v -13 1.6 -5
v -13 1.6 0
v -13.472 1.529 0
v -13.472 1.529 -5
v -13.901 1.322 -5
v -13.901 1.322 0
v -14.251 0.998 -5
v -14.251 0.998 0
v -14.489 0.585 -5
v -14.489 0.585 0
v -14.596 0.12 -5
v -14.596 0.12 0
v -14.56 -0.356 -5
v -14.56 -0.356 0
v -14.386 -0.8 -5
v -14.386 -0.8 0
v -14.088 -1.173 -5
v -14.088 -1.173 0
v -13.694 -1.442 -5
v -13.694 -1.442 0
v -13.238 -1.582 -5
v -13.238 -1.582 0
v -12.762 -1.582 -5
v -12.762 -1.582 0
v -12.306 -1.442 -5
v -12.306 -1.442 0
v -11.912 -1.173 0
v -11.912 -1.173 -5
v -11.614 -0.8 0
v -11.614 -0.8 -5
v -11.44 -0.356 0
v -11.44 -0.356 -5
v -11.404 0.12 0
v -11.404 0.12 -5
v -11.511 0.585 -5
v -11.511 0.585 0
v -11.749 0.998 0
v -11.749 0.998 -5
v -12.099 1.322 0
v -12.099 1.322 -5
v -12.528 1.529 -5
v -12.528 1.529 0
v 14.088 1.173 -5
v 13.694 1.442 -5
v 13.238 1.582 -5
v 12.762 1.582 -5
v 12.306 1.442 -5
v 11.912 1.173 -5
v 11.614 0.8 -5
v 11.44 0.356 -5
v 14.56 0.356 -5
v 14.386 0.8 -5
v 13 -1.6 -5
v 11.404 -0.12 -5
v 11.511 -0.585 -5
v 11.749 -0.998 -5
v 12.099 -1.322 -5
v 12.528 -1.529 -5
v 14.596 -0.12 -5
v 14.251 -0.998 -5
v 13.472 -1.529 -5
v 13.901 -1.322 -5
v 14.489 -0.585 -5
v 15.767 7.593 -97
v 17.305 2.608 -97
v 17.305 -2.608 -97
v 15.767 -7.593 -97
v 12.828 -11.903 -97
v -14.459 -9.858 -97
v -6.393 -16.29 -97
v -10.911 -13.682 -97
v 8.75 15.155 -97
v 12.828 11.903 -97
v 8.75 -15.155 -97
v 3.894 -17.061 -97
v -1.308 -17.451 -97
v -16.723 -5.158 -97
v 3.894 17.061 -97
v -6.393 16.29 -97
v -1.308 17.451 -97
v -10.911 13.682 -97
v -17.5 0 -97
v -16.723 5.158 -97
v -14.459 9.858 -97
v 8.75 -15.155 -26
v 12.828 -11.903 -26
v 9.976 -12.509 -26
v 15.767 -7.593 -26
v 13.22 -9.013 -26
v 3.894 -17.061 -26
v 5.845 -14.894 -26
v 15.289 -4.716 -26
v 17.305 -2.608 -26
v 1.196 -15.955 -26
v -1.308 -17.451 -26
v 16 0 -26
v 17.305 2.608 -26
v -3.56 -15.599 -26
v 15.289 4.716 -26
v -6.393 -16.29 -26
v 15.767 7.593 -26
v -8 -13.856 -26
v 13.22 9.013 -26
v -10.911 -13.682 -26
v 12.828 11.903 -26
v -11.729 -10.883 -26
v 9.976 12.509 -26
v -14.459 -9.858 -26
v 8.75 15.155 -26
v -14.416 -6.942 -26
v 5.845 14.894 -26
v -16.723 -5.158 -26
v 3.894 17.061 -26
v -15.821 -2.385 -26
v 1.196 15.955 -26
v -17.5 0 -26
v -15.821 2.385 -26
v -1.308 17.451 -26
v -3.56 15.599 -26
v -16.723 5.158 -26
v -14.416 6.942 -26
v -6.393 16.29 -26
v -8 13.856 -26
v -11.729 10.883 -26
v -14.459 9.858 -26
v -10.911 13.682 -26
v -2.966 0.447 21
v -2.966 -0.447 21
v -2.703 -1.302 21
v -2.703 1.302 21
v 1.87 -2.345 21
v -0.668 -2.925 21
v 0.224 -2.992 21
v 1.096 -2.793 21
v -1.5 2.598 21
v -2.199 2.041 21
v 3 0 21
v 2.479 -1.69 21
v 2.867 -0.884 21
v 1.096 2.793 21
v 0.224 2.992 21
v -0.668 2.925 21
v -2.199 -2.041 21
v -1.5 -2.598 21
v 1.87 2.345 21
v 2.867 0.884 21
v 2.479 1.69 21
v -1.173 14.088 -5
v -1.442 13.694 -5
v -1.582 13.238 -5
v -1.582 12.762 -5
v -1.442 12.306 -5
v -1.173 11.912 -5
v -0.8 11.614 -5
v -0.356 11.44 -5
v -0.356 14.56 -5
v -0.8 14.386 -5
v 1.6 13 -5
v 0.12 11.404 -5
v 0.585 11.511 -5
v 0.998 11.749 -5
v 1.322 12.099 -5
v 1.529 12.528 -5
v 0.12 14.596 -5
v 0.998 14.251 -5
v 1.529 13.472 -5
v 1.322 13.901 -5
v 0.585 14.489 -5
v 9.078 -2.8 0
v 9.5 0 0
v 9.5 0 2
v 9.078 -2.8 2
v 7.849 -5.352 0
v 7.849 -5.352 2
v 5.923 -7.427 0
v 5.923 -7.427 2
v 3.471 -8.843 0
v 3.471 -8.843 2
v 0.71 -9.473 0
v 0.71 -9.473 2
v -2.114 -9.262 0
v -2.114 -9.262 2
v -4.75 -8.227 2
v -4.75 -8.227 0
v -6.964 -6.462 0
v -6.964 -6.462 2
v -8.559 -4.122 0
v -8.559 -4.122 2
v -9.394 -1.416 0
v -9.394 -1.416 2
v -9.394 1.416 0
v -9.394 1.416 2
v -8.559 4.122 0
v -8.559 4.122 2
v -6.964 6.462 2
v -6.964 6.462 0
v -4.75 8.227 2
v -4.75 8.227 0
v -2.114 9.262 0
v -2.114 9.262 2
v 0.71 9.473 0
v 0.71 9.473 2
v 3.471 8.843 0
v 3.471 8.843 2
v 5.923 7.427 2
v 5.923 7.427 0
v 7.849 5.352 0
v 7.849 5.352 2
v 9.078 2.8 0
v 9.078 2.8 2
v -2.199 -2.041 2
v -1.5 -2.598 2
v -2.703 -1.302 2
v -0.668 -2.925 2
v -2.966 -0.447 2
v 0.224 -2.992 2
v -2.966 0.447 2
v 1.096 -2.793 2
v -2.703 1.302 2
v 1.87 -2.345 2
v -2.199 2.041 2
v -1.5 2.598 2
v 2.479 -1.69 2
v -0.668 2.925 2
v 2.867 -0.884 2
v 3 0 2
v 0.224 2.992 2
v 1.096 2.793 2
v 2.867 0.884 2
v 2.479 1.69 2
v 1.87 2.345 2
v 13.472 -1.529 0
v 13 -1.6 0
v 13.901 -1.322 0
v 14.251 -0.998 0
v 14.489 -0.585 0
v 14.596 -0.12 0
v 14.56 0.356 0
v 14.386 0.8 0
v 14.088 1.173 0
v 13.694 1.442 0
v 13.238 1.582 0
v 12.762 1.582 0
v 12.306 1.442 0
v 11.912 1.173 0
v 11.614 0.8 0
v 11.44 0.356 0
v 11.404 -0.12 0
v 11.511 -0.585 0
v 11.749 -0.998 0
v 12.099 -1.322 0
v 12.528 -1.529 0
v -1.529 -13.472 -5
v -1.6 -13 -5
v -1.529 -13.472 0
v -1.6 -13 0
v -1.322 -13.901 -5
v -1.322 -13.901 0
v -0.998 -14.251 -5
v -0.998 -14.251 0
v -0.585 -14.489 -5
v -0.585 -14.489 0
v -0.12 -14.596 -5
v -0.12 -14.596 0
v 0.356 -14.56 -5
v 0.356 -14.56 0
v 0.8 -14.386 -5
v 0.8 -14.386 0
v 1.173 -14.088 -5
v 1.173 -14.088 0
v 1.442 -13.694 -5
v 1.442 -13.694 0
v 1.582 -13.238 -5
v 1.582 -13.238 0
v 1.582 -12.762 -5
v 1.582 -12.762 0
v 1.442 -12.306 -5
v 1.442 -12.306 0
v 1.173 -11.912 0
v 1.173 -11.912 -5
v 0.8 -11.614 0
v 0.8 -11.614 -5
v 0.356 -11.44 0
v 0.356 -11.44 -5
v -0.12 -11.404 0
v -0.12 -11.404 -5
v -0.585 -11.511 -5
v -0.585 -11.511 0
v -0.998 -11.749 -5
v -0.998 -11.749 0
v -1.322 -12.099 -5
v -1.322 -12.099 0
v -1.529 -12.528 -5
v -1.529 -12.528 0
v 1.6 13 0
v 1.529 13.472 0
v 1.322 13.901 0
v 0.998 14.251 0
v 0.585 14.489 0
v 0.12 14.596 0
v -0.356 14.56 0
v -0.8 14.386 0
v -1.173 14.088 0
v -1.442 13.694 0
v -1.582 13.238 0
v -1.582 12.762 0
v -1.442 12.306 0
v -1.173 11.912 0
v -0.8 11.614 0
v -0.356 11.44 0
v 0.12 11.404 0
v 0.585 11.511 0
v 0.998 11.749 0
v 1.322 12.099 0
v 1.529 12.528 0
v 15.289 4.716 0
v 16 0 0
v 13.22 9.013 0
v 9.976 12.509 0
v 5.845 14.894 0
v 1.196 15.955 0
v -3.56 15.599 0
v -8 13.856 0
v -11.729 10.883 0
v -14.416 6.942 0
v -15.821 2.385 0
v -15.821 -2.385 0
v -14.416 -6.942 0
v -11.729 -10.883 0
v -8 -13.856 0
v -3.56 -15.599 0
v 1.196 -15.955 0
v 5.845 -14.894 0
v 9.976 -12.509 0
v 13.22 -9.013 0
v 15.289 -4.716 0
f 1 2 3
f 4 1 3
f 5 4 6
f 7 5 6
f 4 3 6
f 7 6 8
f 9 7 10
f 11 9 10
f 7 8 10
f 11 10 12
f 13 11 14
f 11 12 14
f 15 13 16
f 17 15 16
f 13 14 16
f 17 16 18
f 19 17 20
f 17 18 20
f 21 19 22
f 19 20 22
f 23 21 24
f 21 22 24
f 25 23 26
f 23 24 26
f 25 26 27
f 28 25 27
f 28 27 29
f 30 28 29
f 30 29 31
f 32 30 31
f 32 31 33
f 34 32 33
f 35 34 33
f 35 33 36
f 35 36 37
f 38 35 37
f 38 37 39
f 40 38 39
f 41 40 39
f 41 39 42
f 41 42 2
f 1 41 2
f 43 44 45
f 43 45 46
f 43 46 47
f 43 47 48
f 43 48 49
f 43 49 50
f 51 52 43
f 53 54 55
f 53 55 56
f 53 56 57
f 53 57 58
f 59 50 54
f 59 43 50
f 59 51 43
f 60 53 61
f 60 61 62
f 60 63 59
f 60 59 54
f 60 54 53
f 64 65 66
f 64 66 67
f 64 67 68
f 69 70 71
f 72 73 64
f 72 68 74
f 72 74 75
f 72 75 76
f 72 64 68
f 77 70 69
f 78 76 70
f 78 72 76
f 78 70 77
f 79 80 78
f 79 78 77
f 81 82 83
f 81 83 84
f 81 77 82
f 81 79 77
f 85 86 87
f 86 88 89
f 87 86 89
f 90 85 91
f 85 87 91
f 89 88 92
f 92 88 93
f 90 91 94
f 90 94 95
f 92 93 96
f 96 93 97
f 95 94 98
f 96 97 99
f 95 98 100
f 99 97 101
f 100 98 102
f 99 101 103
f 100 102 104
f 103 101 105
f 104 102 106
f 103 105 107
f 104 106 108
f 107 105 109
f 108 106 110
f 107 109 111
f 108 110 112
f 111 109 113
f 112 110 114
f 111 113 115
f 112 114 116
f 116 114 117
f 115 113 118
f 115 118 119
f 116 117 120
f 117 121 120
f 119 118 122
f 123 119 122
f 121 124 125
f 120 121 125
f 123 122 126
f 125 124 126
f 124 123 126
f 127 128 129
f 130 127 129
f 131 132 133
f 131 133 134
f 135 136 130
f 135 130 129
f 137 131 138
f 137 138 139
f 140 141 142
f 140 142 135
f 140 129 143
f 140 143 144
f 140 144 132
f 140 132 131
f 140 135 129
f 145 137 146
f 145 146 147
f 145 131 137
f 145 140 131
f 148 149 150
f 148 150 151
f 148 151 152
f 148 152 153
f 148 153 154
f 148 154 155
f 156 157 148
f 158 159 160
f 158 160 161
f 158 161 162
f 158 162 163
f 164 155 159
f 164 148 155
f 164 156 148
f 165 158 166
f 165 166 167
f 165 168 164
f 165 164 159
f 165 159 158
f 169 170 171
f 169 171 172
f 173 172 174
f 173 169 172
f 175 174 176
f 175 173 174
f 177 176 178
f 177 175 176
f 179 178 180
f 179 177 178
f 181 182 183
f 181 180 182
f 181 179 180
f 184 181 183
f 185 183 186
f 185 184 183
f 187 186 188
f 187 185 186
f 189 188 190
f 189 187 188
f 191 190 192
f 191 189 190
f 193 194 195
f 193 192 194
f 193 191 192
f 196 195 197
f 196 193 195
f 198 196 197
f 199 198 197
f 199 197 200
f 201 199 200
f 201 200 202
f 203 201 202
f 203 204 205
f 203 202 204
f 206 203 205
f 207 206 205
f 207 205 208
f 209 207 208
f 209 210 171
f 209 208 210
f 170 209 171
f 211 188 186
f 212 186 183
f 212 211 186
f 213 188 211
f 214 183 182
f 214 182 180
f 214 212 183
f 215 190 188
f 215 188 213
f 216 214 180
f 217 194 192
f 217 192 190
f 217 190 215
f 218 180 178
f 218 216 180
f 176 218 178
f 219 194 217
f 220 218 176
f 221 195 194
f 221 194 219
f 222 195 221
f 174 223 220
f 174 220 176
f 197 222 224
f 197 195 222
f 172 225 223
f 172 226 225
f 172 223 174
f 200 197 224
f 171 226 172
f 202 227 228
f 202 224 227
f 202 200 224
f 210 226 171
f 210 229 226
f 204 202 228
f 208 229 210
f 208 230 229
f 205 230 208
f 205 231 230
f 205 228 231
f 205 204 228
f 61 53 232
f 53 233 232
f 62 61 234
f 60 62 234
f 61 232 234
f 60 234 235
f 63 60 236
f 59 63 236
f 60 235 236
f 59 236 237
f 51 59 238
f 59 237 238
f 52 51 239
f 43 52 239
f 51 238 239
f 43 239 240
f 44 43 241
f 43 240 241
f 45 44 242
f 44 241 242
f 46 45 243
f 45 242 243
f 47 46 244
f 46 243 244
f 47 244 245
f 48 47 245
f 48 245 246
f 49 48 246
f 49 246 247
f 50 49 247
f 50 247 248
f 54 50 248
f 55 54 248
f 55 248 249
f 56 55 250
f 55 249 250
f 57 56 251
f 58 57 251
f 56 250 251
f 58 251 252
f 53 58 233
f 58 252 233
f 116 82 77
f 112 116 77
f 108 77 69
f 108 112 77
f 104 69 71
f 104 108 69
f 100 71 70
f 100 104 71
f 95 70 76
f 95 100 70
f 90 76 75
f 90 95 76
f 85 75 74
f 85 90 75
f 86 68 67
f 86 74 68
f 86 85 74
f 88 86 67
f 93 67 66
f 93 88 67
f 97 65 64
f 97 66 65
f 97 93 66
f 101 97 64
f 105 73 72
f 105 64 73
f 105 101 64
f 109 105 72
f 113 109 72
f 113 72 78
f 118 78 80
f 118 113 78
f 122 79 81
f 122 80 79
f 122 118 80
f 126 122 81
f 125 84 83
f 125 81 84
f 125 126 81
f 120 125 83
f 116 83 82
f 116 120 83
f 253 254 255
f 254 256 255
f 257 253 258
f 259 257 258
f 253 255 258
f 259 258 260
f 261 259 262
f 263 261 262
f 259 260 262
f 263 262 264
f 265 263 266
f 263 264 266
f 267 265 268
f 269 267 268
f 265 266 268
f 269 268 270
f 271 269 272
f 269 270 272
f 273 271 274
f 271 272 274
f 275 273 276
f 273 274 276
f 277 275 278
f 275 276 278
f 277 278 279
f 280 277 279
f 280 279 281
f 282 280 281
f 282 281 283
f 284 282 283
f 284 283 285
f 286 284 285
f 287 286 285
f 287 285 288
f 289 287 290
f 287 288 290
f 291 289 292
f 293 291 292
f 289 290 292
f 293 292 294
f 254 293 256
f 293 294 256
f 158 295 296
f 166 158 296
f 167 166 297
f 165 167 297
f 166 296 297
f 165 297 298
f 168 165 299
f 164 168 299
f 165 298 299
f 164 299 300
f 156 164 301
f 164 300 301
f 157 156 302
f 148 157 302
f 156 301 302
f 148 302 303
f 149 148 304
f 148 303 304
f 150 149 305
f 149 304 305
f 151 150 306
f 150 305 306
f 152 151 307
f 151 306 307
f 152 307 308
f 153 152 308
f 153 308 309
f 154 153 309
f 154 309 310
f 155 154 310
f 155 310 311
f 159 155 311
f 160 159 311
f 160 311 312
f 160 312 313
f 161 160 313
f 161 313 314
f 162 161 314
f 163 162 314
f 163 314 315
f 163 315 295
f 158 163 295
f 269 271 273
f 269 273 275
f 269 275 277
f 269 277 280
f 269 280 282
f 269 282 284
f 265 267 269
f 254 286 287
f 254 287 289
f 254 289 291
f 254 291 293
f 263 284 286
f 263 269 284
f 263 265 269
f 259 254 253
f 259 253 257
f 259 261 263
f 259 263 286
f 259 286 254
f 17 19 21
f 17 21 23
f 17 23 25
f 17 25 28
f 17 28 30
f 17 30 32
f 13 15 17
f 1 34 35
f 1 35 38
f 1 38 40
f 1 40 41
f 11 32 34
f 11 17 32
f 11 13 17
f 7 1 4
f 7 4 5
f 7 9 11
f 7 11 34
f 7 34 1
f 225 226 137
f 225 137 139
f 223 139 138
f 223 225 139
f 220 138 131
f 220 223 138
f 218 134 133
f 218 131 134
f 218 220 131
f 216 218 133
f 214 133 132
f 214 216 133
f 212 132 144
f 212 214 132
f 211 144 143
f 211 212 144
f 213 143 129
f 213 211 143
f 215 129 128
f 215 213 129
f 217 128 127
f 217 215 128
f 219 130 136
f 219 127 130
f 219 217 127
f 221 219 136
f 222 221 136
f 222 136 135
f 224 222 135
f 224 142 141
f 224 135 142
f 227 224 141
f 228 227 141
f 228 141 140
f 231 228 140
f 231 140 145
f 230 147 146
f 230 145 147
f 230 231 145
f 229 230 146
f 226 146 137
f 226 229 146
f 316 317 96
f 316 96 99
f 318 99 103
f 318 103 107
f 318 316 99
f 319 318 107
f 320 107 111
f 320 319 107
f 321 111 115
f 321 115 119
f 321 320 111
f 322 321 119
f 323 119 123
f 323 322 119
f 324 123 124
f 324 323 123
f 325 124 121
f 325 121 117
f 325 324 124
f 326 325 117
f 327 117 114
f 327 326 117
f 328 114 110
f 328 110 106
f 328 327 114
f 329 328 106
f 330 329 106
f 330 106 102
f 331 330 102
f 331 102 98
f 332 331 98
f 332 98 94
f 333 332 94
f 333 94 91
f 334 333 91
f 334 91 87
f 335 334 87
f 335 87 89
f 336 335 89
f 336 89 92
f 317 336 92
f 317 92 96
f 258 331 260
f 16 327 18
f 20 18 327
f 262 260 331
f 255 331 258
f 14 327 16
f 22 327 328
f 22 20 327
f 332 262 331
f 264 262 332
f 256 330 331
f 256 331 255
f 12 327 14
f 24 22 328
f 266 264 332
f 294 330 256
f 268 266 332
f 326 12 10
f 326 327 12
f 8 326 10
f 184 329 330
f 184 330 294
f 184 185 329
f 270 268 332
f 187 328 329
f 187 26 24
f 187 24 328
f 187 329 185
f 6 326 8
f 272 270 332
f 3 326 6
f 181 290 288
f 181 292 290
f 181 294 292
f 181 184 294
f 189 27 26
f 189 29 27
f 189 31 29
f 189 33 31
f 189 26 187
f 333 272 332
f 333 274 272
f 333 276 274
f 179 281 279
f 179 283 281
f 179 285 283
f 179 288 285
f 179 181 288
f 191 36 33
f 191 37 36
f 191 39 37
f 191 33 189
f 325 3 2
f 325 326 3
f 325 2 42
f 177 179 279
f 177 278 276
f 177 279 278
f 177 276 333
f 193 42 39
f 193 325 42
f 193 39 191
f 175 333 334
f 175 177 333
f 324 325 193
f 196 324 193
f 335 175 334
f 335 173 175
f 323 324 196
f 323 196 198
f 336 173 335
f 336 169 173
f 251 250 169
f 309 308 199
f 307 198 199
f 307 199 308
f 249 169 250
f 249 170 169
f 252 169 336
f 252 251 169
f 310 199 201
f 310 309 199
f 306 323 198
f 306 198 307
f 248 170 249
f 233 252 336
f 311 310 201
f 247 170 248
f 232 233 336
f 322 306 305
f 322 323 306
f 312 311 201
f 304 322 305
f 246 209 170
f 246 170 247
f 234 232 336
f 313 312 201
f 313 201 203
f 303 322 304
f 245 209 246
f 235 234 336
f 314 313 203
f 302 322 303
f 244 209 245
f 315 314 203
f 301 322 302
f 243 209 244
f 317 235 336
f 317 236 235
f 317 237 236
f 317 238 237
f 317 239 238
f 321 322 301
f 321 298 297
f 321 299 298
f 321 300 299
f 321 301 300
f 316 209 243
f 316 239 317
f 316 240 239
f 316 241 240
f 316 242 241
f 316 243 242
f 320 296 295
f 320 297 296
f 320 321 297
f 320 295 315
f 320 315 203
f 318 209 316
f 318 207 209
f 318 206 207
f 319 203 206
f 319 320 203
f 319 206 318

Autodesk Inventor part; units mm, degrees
ref_plane "YZ Plane" through (0, 0, 0) normal (1, 0, 0) x (0, 1, 0)
ref_plane "XZ Plane" through (0, 0, 0) normal (0, 1, 0) x (-1, 0, 0)
ref_plane "XY Plane" through (0, 0, 0) normal (0, 0, 1) x (1, 0, 0)
sketch "スケッチ1" plane through (0, 0, 0) normal (0, 0, 1) x (1, 0, 0)
  circle A0 centre (0, 0) radius 16
  dimension "d0" = 32
extrude "押し出し1" add sketch "スケッチ1" against normal blind 26
sketch "スケッチ2" plane through (0, 0, -26) normal (0, 0, -1) x (-1, 0, 0)
  circle A0 centre (0, 0) radius 17.5
  dimension "d3" = 35
extrude "押し出し2" add sketch "スケッチ2" along normal blind 71
sketch "スケッチ3" plane through (0, 0, 0) normal (0, 0, 1) x (1, 0, 0)
  circle A0 centre (0, 13) radius 1.6
  point P0 (0, 0)
  dimension "d6" = 3.2
  dimension "d7" = 13
extrude "押し出し3" cut sketch "スケッチ3" against normal blind 5
pattern_circular "円形状パターン1" count 4 over 360 about axis through (0, 0, -10) along (0, 0, 1) of "押し出し3"
sketch "スケッチ4" plane through (0, 0, 0) normal (0, 0, 1) x (1, 0, 0)
  circle A0 centre (0, 0) radius 9.5
  dimension "d13" = 19
extrude "押し出し4" add sketch "スケッチ4" along normal blind 2
sketch "スケッチ5" plane through (0, 0, 2) normal (0, 0, 1) x (1, 0, 0)
  circle A0 centre (0, 0) radius 3
  dimension "d16" = 6
extrude "押し出し5" add sketch "スケッチ5" along normal blind 19
properties part number "motor" material "アルミニウム 6061"
